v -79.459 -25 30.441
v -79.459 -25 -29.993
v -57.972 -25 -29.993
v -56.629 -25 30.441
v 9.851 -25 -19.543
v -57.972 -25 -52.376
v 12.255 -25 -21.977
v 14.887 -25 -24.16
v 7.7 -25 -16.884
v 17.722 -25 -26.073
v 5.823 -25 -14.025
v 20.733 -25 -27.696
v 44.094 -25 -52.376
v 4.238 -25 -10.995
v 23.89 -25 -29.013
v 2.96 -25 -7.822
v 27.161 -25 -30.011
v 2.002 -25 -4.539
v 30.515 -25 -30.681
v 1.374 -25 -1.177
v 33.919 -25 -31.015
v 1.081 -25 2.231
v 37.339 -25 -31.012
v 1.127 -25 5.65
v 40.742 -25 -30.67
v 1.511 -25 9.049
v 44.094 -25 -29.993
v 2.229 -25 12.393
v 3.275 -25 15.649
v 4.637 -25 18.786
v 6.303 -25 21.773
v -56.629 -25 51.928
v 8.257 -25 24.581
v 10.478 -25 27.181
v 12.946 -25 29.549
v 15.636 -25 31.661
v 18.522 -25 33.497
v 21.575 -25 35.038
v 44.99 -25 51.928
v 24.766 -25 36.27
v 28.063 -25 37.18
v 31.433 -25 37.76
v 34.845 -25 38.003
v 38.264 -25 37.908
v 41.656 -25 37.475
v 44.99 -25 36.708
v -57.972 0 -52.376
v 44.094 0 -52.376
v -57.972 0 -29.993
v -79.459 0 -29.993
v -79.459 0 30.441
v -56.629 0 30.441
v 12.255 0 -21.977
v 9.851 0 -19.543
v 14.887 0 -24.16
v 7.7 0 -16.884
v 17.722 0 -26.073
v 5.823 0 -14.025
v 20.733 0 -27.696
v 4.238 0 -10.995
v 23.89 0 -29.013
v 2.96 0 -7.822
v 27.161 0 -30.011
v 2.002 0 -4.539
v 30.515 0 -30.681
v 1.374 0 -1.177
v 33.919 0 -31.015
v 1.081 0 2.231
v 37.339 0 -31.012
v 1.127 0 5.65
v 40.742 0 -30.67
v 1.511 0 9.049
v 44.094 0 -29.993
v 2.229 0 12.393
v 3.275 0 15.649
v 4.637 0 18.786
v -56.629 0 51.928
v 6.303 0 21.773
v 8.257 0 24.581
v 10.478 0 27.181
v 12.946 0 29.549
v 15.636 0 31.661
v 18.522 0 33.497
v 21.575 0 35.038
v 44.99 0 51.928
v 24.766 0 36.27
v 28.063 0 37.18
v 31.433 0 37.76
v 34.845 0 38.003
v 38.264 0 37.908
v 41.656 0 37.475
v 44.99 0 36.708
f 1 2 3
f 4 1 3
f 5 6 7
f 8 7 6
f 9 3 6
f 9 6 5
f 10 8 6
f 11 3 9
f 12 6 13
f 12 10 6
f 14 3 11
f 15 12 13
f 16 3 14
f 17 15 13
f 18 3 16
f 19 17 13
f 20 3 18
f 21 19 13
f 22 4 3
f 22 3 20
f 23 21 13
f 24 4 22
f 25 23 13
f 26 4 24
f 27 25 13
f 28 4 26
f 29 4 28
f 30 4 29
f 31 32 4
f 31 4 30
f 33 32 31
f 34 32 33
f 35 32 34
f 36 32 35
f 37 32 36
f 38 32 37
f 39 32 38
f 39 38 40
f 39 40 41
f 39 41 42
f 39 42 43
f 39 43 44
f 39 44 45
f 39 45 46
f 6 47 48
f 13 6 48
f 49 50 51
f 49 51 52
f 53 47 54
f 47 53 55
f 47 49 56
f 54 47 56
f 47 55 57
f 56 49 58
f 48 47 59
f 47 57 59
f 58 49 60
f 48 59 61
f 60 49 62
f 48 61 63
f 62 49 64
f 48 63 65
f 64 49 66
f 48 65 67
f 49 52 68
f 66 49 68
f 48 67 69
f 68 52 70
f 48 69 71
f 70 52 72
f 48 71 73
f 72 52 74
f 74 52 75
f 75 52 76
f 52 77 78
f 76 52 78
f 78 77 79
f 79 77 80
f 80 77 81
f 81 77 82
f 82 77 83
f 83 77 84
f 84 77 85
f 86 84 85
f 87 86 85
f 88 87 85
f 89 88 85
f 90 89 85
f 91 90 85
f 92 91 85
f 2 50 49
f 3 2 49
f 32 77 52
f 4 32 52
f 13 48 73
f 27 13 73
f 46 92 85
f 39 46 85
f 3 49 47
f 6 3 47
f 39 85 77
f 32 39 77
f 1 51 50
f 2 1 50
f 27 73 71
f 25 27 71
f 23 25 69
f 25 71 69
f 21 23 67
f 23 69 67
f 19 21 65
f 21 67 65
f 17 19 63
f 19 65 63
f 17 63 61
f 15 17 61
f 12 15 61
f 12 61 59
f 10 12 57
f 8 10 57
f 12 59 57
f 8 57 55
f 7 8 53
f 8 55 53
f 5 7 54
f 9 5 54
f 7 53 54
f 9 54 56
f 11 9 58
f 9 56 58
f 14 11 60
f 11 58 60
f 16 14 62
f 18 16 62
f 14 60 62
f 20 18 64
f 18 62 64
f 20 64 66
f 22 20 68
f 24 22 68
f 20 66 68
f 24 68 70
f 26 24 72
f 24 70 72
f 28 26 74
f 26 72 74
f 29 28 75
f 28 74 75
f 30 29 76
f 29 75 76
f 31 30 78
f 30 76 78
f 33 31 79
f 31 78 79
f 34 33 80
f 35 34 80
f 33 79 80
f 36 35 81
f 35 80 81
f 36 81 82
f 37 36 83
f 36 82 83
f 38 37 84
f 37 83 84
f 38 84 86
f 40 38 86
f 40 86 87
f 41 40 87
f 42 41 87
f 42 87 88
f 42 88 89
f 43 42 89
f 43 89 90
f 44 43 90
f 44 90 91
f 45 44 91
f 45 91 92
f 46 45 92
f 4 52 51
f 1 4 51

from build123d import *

# Parameters (mm, degrees)
F1_DEPTH = 25


with BuildPart() as f1:
    # F0 (on Front) → F1 (new body)
    with BuildSketch(Plane.XZ):
        with BuildLine():
            Line((44.989612, 51.928312), (-56.628712, 51.928312))
            Line((-56.628712, 51.928312), (-56.628712, 30.440735))
            Line((-56.628712, 30.440735), (-79.459257, 30.440735))
            Line((-79.459257, 30.440735), (-79.459257, -29.99307))
            Line((-79.459257, -29.99307), (-57.971686, -29.99307))
            Line((-57.971686, -29.99307), (-57.971686, -52.375961))
            Line((-57.971686, -52.375961), (44.094294, -52.375961))
            Line((44.094294, -52.375961), (44.094294, -29.99307))
            ThreePointArc((44.094294, -29.99307), (1.06181, 3.941063), (44.989612, 36.707941))
            Line((44.989612, 36.707941), (44.989612, 51.928312))
        make_face()
    extrude(amount=F1_DEPTH)


solid = f1.part
